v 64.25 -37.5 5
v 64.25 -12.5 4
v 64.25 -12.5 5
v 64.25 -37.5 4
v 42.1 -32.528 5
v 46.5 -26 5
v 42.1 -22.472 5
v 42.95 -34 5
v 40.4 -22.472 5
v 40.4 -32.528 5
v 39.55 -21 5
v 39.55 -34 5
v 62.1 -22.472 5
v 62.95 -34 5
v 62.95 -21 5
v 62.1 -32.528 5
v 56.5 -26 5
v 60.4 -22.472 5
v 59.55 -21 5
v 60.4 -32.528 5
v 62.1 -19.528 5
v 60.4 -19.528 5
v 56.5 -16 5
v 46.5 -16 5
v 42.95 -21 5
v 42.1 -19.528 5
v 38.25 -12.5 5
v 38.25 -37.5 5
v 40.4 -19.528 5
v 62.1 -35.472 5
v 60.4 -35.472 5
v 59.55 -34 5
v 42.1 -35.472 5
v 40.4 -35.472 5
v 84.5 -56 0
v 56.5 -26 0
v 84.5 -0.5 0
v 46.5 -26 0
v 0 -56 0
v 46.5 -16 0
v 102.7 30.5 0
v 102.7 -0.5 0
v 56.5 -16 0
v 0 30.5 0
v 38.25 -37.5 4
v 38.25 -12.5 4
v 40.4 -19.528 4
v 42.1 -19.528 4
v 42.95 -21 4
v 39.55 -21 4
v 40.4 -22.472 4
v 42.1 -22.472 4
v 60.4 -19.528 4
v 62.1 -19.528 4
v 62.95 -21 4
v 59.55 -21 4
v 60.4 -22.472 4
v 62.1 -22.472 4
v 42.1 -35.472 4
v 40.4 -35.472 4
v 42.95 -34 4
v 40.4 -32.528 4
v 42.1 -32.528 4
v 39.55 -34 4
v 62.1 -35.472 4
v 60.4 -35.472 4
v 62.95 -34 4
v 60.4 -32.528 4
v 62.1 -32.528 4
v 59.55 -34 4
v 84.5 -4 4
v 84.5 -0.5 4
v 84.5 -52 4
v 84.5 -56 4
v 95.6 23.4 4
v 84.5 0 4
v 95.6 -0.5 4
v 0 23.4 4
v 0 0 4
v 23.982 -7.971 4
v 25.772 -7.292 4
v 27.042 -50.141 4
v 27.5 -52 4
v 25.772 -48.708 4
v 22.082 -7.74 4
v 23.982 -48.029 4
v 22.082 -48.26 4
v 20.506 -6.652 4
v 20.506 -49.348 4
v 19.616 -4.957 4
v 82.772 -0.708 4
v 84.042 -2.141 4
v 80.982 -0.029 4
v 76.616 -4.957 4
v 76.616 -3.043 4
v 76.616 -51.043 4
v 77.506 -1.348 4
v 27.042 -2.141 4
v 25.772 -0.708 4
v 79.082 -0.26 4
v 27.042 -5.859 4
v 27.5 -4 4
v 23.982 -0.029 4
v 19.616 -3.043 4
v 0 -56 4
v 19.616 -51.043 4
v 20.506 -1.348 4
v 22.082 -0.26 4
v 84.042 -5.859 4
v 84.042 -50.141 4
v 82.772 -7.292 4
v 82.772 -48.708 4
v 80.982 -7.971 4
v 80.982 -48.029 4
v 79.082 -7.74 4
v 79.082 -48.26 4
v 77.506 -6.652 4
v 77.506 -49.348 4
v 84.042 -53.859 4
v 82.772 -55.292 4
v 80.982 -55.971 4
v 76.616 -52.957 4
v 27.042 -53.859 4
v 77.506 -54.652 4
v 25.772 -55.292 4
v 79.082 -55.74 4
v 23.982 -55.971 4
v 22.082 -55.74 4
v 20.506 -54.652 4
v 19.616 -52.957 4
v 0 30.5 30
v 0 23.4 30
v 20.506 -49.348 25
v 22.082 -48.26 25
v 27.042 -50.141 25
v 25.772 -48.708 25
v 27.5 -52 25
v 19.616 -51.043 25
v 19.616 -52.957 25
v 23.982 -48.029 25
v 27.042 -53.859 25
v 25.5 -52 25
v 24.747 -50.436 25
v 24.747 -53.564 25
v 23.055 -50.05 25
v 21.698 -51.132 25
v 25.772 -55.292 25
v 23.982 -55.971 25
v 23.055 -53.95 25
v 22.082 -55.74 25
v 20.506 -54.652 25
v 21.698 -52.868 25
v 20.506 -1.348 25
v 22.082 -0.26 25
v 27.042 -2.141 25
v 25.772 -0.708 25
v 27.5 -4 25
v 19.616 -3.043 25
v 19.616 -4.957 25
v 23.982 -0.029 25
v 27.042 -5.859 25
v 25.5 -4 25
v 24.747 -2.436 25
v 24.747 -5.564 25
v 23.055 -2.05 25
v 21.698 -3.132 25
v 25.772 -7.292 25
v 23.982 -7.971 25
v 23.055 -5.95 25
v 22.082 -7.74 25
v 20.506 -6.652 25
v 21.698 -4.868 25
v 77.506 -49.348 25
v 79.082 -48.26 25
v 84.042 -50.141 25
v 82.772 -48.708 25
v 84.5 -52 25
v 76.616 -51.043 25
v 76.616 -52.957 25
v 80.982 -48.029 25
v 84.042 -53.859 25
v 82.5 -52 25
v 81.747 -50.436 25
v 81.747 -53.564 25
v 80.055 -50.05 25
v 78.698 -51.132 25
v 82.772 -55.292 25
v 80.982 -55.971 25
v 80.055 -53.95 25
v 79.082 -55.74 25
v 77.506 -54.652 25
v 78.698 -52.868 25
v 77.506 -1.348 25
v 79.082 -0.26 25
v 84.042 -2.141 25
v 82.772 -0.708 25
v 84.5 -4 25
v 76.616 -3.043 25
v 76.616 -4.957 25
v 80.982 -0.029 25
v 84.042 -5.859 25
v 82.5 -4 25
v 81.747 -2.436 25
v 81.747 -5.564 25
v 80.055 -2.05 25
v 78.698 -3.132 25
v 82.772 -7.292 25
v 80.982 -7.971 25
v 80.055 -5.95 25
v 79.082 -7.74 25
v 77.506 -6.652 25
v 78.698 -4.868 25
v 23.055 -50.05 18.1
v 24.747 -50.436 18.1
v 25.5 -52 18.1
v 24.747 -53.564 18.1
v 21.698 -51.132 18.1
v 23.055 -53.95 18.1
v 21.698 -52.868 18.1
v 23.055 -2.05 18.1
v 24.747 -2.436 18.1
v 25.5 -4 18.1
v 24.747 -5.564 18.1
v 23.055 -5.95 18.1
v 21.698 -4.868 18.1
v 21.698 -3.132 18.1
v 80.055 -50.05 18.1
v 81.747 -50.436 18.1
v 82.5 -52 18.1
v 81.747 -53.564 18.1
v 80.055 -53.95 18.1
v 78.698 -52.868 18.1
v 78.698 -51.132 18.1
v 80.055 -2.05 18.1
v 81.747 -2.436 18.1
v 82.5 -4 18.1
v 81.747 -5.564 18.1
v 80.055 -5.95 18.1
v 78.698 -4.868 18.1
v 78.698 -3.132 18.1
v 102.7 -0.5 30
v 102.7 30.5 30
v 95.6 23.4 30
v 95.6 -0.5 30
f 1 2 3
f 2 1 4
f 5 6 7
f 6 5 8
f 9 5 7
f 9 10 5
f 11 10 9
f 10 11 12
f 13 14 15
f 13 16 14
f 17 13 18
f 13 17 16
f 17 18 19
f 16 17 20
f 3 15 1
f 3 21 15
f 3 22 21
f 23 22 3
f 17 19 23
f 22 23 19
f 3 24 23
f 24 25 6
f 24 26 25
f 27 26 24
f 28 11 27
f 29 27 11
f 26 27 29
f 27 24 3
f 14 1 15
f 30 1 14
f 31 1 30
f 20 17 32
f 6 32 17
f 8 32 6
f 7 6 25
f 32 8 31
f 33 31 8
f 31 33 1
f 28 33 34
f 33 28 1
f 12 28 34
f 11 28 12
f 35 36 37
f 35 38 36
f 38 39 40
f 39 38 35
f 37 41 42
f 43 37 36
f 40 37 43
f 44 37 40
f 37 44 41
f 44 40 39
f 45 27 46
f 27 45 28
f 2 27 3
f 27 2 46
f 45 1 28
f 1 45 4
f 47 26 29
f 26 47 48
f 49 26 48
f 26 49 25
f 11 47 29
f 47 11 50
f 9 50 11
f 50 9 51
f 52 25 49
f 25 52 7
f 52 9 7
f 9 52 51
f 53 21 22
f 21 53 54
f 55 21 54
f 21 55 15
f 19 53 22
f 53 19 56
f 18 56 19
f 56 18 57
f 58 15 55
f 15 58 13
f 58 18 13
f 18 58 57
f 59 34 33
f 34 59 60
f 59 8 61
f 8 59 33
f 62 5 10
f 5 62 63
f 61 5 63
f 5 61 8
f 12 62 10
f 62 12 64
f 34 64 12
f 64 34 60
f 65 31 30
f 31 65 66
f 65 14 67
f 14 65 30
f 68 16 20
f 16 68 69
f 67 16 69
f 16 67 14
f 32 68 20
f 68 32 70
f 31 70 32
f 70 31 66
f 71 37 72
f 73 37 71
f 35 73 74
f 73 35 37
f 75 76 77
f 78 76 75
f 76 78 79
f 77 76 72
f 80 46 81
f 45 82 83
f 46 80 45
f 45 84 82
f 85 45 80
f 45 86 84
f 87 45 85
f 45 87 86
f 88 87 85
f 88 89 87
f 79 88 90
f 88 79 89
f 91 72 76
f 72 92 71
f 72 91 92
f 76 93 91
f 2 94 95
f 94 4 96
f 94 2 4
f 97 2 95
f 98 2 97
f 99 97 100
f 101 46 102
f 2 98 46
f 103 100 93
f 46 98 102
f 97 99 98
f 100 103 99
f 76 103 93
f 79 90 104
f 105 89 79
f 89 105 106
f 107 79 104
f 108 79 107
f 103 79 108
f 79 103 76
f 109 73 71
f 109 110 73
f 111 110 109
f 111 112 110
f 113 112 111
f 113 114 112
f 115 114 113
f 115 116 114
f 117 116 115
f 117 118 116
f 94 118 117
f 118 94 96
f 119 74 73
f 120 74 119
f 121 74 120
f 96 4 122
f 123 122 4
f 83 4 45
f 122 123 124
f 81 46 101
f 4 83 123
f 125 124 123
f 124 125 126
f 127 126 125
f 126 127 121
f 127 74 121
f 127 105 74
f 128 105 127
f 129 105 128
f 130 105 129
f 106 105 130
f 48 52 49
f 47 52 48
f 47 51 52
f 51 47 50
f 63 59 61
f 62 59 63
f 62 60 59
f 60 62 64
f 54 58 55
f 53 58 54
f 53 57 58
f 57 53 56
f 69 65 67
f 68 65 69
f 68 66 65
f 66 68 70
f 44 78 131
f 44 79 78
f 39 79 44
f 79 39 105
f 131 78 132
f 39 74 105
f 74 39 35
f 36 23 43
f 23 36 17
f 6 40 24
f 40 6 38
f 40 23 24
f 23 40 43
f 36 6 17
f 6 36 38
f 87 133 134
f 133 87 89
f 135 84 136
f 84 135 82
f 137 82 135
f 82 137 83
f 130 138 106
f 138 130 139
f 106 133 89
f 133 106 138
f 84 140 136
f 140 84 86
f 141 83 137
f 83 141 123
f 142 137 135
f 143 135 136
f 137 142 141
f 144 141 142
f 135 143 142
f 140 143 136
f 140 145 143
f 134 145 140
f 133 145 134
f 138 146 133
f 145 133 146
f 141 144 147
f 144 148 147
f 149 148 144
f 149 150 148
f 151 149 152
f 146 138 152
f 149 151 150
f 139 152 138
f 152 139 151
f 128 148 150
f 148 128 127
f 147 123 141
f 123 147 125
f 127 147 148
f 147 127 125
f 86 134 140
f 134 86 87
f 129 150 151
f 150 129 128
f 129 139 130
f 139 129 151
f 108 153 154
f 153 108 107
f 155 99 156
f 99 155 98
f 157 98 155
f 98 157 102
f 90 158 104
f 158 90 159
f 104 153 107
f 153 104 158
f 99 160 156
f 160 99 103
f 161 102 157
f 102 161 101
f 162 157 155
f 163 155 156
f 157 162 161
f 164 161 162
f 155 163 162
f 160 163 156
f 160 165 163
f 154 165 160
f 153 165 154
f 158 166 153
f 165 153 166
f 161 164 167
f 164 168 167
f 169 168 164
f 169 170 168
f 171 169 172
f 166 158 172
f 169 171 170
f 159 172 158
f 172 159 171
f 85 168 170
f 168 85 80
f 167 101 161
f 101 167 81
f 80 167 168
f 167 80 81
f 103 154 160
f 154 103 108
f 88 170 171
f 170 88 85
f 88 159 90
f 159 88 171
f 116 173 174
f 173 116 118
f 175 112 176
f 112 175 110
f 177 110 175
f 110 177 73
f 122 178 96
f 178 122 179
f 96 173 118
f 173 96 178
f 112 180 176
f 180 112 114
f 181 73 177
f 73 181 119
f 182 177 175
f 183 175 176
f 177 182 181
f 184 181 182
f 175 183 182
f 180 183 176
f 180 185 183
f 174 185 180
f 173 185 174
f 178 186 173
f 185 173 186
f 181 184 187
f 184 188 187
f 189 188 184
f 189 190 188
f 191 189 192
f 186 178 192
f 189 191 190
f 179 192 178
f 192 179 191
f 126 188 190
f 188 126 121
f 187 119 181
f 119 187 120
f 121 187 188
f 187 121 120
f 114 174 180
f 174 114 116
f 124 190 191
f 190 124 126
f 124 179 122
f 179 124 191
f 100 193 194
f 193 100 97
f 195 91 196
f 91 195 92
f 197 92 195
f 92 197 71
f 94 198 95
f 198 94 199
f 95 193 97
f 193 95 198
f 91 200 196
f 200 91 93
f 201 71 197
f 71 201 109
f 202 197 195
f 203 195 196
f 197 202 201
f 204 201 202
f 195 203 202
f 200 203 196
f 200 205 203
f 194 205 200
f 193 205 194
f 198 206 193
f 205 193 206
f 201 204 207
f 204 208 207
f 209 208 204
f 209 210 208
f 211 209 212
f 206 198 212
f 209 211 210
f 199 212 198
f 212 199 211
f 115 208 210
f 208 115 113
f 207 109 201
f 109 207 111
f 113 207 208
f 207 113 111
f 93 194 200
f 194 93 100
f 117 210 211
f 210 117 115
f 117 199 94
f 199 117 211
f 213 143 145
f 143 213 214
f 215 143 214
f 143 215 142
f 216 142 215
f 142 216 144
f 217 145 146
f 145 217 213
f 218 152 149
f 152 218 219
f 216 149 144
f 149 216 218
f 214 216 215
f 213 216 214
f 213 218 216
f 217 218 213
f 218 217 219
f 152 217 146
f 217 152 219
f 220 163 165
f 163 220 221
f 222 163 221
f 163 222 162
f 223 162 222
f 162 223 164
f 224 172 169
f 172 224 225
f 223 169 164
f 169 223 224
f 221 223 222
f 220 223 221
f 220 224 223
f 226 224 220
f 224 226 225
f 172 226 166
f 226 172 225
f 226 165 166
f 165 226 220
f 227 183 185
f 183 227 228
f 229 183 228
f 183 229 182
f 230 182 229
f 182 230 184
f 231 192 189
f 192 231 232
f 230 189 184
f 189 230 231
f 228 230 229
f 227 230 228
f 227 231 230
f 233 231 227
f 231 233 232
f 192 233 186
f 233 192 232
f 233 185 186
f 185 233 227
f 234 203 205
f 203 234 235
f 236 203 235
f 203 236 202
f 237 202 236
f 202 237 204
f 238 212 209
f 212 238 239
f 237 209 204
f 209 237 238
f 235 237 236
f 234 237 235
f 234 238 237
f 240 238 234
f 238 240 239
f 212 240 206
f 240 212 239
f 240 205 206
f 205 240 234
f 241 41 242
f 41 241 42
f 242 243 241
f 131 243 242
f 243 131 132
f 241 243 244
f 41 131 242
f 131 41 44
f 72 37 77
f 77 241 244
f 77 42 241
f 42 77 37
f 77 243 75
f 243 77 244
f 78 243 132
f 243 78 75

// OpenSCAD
pared = 4;
pared2 = 2*pared;
h = 25;
raspW = 84.5;
raspH = 56;


//Tornillos
tornDeep = 7;
baseTor = 3+1;
raspTor = 1+1;
raspTorCeja = 4;
x1 = 23.5;
y1 = raspTorCeja;
x2 = x1;
y2 = raspH-raspTorCeja;
x3 = raspW-raspTorCeja;
y3 = raspTorCeja;
x4 = x3;
y4 = raspH-raspTorCeja;
camW=26;
camH=25;
alsaCamX = (raspW/2)+9;
alsaCamY = (raspH/2)-(5);

batW = 94.7;
batH = 23;
batD = 22;


translate([0,-raspH,0])
tornAndCam();

bateriaArea();



module tornAndCam()
{
	tapaRaspCam();
	guiaBaseTornillos(h);
}


module bateriaArea()
{
	difference()
	{
		translate([0,-0.5,0])
		cube([
				batW+pared2,
				batH+pared2,
				batD+pared2
			]);
		

		translate([
						-0.1,
						-0.6,
						pared]
					)
		cube([batW+1,batH+1,batD+pared+1]);


	}
}


module tapaRaspCam()
{	
	difference()
	{
	placaSolida(5);
	translate([46.5,30,-0.5])
	cube([10,10,20]);
	}
}


module placaSolida(h)
{
	translate([alsaCamX,alsaCamY,0])
	alsaCam(h);
	cube([raspW,raspH,pared]);
}

module guiaBaseTornillos(h)
{
	difference()
	{
	tornillosBase(h);
	translate([0,0,h-(tornDeep-0.2)])
	huevoTornillos(tornDeep);
	}
}


module tornillosBase(h)
{
	translate([x1,y1,0])
	cylinder(r=baseTor,h);

	translate([x2,y2,0])
	cylinder(r=baseTor,h);

	translate([x3,y3,0])
	cylinder(r=baseTor,h);

	translate([x4,y4,0])
	cylinder(r=baseTor,h);
}

module huevoTornillos(h)
{
	translate([x1,y1,-0.1])
	cylinder(r=raspTor,h);

	translate([x2,y2,-0.1])
	cylinder(r=raspTor,h);

	translate([x3,y3,-0.1])
	cylinder(r=raspTor,h);

	translate([x4,y4,-0.1])
	cylinder(r=raspTor,h);
}


module alsaCam(h)
{
difference(){

	translate([-13,-4.5,0])
	cube([camW,camH,h]);

	//Tornillos camara
	translate([-10,12,0.2])
	cylinder(r=1.7,h+1);
	translate([10,12,0.2])
	cylinder(r=1.7,h+1);
	translate([-10,-1,0.2])
	cylinder(r=1.7,h+1);
	translate([10,-1,0.2])
	cylinder(r=1.7,h+1);
}
}
